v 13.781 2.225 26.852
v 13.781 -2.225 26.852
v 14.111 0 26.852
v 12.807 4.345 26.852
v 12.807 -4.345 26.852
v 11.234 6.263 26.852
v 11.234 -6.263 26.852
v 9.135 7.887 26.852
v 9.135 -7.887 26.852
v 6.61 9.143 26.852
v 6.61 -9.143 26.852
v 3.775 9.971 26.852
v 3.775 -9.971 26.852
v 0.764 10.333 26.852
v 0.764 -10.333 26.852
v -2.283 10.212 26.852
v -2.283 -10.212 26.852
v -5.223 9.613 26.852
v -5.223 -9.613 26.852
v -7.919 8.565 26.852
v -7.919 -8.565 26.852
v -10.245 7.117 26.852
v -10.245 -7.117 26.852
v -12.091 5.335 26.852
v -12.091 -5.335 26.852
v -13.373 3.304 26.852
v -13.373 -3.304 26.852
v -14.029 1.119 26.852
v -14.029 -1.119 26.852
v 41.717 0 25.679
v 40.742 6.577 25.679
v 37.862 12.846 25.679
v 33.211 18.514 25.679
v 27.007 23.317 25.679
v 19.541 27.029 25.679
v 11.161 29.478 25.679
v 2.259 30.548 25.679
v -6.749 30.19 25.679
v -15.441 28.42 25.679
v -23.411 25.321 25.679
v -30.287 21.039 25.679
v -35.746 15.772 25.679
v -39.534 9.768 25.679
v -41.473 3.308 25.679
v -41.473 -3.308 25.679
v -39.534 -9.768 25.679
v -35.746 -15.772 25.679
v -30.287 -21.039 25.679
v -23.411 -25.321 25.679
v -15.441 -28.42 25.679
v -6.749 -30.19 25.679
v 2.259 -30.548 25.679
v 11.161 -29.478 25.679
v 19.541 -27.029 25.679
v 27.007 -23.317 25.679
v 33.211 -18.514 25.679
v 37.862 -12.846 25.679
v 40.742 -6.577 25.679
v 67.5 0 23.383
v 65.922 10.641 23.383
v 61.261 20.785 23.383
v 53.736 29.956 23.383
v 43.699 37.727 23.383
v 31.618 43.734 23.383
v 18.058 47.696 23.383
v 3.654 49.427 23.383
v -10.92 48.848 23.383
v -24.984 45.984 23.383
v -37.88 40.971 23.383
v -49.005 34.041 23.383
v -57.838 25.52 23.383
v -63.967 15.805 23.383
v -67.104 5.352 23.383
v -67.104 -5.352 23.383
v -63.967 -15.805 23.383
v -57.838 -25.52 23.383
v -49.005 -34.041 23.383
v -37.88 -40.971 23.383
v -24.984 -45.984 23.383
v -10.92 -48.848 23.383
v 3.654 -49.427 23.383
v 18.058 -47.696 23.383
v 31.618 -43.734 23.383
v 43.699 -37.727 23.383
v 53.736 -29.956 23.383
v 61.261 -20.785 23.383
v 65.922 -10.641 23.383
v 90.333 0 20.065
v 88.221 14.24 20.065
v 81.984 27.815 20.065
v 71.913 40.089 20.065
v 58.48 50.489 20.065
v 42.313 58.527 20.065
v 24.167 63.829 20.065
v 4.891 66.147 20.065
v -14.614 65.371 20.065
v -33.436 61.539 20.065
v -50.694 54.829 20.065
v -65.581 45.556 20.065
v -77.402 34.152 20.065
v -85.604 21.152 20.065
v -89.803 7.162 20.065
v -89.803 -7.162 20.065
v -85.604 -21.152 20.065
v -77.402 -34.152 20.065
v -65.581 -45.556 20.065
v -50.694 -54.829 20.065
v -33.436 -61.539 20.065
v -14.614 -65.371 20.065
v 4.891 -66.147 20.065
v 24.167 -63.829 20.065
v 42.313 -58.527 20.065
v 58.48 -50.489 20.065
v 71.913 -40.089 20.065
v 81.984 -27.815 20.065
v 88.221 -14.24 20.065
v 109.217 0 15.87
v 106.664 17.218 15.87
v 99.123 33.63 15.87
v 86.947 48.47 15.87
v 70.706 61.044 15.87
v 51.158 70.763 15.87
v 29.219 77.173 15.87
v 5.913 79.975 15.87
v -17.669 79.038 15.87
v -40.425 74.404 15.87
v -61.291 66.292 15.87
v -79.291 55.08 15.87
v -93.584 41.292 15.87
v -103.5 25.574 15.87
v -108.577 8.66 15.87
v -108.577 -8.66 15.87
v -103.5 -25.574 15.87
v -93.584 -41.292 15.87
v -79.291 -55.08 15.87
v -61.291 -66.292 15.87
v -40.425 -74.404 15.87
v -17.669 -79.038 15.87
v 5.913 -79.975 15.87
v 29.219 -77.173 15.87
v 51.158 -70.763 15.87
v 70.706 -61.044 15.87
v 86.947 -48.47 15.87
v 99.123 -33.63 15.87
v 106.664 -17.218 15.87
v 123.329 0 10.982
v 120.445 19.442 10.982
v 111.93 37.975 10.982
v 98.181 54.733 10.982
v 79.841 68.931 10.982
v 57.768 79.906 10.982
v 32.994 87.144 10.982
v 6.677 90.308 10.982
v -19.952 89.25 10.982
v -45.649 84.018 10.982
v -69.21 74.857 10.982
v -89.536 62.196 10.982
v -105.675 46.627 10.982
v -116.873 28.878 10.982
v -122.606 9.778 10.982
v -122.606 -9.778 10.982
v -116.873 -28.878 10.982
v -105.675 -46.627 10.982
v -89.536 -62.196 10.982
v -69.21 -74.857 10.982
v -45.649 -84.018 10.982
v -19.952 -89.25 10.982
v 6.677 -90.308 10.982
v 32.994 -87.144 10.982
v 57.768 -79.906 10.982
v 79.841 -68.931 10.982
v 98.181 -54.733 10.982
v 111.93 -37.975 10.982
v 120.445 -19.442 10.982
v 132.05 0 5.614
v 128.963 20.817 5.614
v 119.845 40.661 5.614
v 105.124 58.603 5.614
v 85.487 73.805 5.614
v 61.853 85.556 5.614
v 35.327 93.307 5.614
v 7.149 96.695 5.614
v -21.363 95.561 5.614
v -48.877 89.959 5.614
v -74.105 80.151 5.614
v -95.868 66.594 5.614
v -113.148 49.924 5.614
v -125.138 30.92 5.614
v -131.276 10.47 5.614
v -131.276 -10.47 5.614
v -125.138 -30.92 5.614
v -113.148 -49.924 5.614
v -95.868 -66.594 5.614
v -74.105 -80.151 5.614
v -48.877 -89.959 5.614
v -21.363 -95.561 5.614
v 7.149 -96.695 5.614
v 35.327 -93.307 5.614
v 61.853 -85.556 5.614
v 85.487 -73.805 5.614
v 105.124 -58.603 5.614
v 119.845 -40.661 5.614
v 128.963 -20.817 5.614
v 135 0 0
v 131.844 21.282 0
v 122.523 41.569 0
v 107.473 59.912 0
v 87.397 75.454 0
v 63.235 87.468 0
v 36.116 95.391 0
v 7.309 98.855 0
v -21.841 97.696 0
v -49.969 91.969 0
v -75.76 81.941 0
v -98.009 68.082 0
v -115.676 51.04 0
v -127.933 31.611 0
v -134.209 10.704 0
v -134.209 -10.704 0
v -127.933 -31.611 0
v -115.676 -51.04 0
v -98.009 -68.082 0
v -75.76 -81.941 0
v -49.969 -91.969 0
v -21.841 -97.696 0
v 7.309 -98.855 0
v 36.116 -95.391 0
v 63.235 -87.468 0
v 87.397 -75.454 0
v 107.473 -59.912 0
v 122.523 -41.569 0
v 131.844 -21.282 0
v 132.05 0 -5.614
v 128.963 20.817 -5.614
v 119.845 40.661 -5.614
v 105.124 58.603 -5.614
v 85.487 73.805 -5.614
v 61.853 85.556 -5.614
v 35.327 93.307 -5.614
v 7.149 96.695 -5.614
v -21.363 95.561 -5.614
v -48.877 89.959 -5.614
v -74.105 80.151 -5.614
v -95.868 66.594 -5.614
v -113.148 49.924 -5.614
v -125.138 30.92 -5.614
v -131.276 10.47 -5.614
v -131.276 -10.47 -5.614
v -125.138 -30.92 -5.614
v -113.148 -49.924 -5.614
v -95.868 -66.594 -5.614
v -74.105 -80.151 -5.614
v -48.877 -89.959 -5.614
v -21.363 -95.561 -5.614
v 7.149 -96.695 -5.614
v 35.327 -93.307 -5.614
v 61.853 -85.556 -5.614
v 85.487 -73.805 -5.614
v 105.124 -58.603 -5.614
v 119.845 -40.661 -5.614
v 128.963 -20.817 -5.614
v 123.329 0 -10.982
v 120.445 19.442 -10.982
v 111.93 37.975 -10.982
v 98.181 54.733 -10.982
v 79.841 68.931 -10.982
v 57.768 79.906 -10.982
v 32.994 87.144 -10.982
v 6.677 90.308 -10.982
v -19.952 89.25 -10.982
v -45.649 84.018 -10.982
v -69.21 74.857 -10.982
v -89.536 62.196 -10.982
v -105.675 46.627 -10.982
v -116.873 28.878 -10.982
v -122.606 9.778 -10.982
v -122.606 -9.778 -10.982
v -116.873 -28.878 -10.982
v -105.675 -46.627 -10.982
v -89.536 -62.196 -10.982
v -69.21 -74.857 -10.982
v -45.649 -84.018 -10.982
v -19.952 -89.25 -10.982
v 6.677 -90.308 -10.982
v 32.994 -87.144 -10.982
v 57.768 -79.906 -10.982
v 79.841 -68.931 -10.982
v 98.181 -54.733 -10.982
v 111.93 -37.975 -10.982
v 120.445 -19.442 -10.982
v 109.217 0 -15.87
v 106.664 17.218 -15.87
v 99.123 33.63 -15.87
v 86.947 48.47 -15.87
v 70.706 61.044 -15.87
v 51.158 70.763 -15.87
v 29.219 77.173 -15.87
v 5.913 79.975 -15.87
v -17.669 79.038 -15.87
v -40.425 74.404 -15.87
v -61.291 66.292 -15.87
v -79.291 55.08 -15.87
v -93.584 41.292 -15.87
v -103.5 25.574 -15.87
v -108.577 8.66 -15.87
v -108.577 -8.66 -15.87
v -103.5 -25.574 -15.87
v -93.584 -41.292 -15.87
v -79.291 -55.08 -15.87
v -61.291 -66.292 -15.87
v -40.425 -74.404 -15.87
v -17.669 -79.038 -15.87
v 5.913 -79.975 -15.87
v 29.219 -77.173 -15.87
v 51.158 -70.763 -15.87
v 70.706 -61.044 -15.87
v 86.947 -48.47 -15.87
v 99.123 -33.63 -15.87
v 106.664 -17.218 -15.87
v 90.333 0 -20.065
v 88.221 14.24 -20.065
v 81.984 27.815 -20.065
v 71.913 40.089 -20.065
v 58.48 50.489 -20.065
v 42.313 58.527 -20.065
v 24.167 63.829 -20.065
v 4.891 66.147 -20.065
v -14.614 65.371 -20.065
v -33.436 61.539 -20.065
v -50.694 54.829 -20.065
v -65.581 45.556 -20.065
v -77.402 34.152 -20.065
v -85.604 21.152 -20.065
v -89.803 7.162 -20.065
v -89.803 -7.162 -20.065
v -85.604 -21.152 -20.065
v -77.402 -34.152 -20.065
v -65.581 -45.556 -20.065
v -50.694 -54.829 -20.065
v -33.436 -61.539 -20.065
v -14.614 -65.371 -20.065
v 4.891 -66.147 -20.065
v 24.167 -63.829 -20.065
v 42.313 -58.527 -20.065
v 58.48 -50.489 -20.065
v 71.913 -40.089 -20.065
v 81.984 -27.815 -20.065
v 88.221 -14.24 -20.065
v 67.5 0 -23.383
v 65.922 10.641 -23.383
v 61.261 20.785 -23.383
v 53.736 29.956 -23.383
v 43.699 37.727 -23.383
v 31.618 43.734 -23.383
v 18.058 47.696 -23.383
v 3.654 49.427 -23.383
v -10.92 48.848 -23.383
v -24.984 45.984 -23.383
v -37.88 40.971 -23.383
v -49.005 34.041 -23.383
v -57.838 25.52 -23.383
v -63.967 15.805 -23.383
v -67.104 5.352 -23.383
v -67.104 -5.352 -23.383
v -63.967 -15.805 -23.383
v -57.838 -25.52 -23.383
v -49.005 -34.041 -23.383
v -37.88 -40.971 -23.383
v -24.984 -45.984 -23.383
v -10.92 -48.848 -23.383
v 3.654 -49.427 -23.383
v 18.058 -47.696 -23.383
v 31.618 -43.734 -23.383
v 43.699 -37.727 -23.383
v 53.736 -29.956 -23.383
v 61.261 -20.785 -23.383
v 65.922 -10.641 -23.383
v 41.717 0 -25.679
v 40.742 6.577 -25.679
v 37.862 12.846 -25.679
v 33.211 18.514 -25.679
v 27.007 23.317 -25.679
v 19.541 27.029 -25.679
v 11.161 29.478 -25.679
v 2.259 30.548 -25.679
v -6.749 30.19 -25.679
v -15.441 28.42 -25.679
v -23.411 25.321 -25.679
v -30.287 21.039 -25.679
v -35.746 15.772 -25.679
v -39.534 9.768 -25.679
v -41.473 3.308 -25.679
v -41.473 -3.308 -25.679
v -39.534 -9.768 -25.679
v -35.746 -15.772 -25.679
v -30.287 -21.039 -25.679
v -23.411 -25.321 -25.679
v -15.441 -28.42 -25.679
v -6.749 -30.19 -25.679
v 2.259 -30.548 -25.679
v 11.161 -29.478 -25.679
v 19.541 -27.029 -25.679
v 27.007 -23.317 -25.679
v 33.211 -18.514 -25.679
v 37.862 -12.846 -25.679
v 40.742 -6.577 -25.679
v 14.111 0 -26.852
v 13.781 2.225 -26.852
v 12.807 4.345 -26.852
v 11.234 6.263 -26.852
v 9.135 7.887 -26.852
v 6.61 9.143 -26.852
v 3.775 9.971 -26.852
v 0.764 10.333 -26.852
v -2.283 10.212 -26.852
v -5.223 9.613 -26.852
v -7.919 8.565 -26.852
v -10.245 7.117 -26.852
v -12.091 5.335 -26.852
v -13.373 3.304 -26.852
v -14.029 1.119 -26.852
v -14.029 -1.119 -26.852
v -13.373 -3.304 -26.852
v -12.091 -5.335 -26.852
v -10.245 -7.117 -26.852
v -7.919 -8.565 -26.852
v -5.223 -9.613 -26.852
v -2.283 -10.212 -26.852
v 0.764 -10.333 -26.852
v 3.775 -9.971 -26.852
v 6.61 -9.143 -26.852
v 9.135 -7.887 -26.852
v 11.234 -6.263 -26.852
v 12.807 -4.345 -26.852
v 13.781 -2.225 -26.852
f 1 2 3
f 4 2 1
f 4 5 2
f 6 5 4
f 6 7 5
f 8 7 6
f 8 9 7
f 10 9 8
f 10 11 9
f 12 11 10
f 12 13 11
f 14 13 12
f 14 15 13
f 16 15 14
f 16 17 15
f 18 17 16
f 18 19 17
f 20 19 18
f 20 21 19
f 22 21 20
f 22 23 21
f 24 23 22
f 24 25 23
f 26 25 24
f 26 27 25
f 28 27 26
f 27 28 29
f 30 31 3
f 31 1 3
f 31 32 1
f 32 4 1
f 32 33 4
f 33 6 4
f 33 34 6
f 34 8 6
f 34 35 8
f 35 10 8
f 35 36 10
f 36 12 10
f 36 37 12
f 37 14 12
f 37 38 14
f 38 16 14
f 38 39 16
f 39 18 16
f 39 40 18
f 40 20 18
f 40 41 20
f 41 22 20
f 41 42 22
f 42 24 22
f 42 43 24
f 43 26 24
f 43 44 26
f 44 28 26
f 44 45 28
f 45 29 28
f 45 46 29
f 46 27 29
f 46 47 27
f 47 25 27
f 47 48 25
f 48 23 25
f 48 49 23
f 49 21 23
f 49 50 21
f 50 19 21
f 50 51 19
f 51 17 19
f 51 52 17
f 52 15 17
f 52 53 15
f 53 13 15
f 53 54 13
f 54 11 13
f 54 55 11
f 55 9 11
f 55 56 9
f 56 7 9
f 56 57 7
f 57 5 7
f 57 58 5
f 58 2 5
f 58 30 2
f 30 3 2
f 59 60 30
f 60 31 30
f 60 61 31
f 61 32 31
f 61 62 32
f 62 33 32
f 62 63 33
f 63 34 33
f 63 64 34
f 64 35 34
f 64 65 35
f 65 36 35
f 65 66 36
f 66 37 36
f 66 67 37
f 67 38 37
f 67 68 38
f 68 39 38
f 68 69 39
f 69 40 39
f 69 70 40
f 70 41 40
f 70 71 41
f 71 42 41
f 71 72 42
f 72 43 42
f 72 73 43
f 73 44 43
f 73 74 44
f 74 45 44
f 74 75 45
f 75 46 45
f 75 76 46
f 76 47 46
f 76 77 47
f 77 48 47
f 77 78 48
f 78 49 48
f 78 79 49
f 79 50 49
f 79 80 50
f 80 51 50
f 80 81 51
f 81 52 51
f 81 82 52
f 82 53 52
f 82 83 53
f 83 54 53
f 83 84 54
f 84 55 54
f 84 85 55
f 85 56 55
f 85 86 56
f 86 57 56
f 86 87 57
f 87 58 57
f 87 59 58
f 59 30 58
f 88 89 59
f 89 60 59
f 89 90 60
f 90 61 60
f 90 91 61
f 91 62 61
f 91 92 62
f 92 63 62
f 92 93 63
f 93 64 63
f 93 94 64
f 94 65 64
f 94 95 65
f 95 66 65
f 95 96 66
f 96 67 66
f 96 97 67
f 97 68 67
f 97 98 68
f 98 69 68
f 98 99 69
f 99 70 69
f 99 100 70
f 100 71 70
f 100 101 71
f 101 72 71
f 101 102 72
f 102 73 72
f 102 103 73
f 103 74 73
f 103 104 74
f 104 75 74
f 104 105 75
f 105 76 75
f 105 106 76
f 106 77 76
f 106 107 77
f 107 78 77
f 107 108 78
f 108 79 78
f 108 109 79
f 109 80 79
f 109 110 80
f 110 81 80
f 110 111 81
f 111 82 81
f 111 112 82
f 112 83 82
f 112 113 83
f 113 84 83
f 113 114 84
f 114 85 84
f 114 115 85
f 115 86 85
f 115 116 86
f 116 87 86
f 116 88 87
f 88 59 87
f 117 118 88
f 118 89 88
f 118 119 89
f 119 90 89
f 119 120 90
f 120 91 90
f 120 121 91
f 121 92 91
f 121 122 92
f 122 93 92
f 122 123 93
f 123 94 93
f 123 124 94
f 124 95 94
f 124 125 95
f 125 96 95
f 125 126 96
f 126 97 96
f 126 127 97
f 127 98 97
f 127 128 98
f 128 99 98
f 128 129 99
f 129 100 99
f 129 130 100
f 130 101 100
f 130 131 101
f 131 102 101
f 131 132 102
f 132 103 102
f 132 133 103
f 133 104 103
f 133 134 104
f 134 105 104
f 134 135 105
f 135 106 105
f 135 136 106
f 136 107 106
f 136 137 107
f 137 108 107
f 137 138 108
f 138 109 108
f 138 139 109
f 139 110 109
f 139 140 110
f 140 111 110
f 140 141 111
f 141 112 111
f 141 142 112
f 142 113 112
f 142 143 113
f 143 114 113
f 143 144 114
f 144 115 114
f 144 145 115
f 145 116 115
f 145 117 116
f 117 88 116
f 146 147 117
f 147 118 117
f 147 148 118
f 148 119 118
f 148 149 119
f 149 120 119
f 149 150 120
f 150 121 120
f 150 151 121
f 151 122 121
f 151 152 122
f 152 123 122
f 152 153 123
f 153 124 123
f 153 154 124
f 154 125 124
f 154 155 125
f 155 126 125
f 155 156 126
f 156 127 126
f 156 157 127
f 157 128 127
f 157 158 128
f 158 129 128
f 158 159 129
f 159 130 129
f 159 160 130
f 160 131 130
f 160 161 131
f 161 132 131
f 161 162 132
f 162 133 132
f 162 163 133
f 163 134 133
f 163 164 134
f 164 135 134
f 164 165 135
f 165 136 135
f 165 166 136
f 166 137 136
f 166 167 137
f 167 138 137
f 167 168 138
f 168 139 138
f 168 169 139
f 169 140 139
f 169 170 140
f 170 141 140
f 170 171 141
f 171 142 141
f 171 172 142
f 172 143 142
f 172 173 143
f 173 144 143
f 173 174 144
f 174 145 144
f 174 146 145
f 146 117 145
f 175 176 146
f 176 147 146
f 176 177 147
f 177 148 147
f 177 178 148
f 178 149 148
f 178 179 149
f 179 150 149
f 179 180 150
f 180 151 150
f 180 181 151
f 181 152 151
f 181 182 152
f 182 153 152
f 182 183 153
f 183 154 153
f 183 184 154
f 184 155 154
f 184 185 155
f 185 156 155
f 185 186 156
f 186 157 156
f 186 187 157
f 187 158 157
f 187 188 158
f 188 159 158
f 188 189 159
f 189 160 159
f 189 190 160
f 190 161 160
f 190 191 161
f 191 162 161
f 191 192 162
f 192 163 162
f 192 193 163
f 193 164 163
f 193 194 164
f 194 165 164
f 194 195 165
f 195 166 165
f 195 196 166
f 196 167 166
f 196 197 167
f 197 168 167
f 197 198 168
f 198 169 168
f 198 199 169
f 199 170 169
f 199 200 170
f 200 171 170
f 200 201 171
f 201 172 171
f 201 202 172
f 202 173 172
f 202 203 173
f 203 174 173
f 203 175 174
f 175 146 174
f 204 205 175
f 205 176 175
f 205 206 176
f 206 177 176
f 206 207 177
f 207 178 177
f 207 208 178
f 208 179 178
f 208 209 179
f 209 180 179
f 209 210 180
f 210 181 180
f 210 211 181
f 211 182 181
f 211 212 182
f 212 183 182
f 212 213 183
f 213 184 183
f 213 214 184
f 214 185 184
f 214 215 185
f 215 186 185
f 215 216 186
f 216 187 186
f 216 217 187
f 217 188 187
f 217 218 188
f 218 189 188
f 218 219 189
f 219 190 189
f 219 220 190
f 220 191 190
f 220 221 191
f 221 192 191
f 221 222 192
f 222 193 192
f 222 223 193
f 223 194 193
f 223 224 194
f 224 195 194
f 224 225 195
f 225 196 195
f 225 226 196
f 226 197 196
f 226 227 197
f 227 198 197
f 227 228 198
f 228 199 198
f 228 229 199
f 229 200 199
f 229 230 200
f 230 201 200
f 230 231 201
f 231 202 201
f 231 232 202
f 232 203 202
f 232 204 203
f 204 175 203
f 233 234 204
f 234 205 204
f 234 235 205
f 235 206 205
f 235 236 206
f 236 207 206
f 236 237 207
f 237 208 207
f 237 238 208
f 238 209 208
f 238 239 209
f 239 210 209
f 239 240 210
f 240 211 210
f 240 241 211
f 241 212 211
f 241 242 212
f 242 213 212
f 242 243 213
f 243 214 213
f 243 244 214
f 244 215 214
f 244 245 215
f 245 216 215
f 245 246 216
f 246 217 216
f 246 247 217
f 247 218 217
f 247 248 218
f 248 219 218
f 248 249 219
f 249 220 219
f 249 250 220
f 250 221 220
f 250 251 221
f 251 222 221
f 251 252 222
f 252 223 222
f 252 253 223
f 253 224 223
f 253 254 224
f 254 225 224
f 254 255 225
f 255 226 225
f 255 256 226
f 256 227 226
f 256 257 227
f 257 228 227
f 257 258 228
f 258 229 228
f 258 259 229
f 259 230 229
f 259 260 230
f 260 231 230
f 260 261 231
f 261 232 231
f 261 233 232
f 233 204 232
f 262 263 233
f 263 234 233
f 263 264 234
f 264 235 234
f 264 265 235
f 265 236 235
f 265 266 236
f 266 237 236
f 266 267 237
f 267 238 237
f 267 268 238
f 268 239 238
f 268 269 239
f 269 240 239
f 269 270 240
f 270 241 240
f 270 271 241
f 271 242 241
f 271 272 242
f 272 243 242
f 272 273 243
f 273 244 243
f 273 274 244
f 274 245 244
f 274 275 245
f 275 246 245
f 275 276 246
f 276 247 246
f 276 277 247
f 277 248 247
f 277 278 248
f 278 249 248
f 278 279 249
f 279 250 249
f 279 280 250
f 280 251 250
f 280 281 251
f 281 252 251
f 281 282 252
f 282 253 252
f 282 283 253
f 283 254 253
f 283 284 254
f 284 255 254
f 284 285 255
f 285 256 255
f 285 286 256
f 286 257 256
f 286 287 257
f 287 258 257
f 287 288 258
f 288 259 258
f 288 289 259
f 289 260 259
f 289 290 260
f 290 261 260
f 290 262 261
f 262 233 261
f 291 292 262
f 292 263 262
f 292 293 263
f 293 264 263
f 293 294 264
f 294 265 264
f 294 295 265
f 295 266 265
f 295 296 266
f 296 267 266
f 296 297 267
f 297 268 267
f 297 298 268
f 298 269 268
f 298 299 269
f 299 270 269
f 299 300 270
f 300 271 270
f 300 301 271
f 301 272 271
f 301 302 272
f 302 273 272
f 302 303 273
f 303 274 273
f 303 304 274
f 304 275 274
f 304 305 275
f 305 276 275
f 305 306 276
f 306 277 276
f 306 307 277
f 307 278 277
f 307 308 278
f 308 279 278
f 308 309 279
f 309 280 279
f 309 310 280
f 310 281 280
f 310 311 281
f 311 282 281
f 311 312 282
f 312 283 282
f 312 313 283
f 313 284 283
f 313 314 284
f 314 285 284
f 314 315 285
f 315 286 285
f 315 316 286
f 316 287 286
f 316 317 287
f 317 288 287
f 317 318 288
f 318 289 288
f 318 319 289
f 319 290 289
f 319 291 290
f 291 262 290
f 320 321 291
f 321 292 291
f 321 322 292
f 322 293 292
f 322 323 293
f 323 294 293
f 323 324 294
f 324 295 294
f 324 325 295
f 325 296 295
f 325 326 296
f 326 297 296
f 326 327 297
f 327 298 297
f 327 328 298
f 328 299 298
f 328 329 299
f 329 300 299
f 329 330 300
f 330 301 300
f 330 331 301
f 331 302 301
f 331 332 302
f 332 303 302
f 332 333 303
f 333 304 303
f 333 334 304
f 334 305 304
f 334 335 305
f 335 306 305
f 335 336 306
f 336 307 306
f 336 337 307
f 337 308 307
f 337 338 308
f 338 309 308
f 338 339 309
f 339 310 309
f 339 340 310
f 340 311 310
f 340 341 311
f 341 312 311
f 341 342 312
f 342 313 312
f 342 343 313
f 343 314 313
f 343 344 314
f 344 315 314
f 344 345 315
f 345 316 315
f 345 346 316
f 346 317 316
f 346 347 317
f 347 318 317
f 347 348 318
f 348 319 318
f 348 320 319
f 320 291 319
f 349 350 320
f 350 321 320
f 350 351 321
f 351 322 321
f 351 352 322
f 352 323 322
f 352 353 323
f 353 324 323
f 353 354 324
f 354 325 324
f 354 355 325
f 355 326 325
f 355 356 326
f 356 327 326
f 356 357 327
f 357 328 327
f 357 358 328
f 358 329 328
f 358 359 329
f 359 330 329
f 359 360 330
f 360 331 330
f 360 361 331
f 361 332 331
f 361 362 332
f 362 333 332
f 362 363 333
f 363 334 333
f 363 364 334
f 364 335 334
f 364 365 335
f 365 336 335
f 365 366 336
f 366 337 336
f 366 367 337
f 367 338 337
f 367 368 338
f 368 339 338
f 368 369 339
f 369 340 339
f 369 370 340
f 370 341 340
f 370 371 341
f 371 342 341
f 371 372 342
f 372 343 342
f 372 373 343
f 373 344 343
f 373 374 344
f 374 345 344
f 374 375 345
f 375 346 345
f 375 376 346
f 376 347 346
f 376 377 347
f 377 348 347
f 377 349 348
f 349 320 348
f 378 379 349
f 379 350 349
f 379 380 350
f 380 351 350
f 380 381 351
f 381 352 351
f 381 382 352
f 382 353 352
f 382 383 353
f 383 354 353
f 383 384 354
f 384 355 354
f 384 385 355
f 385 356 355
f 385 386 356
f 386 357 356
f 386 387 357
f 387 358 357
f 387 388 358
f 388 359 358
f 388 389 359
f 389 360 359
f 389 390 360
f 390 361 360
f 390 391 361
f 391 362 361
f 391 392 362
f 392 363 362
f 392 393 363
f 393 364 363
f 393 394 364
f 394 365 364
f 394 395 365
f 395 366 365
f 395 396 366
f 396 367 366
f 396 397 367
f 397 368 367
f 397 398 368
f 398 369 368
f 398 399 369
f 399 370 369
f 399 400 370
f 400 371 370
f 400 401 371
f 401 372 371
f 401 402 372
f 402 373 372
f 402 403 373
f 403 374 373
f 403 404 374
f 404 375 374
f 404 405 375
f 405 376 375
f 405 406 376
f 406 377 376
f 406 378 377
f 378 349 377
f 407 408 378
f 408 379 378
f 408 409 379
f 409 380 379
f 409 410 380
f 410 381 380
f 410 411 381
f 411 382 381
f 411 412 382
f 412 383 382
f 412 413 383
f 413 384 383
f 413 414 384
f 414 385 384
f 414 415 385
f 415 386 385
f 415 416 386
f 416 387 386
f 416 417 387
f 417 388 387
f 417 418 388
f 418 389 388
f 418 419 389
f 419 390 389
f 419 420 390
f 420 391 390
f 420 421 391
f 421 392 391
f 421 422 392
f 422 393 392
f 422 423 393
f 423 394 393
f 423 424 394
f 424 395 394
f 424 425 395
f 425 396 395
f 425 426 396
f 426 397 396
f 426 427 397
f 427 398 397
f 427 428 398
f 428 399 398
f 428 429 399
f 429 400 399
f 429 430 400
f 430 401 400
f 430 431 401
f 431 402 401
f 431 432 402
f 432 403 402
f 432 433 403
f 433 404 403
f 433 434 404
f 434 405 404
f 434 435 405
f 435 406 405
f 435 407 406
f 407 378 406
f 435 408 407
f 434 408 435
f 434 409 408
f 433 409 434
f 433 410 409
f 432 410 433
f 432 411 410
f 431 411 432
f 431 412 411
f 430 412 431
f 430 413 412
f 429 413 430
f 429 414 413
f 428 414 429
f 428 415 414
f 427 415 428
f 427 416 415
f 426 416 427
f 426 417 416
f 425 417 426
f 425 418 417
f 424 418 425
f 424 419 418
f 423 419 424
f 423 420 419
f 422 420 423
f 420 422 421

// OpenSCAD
// Generated by SolidPython 1.0.1 on 2020-07-29 00:46:52


scale(v = [15, 11, 3]) {
	sphere(r = 9);
}
/***********************************************
*********      SolidPython code:      **********
************************************************
 
# import packages: SolidPython
from solid import *
from solid.utils import *
from itertools import chain, combinations, permutations


class Resize:

    def __init__(self, scad_file):
        self.scad_file = scad_file
        #self.scad_file = import_scad(scad_file)
        # cone/cylinder param:
        self.r1 = 0
        self.r2 = 0
        self.h = 0
        # rectangular prism param:
        self.w = 0
        self.l = 0
        # ellipse param:
        self.r = 0

    # import OpenScad code (file name corresponds to shape)


    # classify shape + parameters
    def assign(self, param1, param2, param3):
        if self.scad_file == 'cone.scad':
            self.r1 = param1
            self.r2 = param2
            self.h = param3
        elif self.scad_file == 'cylinder.scad':
            self.r1 = param1
            self.r2 = param2
            self.h = param3
        elif self.scad_file == 'rectangularPrism.scad':
            self.h = param1
            self.l = param2
            self.w = param3
        else:
            self.r = param1
            self.h = param2

    # resize parameters
    def iterate(self):
        x = range(3, 20, 2)
        i = 1
        if self.scad_file == 'cone.scad':
            tempList = list(permutations(x, 2))
            for temp in tempList:
                param1 = temp[0]
                param2 = temp[1]
                filepath = 'produced_scad_files/' + 'cone' + str(param1) + '_' + str(param2) + '_' + '.scad'
                scad_render_to_file(cylinder(h=param1, r1=param2, r2=0), filepath)

        elif self.scad_file == 'cylinder.scad':
            tempList = list(permutations(x, 3))
            for temp in tempList:
                param1 = temp[0]
                param2 = temp[1]
                filepath = 'produced_scad_files/' + 'cylinder' + str(param1) + '_' + str(param2) + '_' + '.scad'
                scad_render_to_file(cylinder(h=param1, r1=param2, r2=param2), filepath)

        elif self.scad_file == 'rectangularPrism.scad':
            tempList = list(permutations(x, 3))
            for temp in tempList:
                param1 = temp[0]
                param2 = temp[1]
                param3 = temp[2]
                filepath = 'produced_scad_files/' + 'rectangularPrism' + str(param1) + '_' + str(param2) + '_' + str(
                    param3) + '.scad'
                scad_render_to_file(cube(size=(param1, param2, param3)), filepath)

        elif self.scad_file == 'ellipse.scad':
            tempList = list(permutations(x, 4))
            for temp in tempList:
                param1 = temp[0]
                param2 = temp[1]
                param3 = temp[2]
                param4 = temp[3]
                filepath = 'produced_scad_files/' + 'ellipse' + str(param1) + '_' + str(param2) + '_' + str(param3) + '_' + str(param4) + '.scad'
                scad_render_to_file(scale([param1, param2, param3])(sphere(r=param4)), filepath)

    def render_to_scadfile(self):
        scad_render_to_file(scad, 'example.scad') 
 
************************************************/
